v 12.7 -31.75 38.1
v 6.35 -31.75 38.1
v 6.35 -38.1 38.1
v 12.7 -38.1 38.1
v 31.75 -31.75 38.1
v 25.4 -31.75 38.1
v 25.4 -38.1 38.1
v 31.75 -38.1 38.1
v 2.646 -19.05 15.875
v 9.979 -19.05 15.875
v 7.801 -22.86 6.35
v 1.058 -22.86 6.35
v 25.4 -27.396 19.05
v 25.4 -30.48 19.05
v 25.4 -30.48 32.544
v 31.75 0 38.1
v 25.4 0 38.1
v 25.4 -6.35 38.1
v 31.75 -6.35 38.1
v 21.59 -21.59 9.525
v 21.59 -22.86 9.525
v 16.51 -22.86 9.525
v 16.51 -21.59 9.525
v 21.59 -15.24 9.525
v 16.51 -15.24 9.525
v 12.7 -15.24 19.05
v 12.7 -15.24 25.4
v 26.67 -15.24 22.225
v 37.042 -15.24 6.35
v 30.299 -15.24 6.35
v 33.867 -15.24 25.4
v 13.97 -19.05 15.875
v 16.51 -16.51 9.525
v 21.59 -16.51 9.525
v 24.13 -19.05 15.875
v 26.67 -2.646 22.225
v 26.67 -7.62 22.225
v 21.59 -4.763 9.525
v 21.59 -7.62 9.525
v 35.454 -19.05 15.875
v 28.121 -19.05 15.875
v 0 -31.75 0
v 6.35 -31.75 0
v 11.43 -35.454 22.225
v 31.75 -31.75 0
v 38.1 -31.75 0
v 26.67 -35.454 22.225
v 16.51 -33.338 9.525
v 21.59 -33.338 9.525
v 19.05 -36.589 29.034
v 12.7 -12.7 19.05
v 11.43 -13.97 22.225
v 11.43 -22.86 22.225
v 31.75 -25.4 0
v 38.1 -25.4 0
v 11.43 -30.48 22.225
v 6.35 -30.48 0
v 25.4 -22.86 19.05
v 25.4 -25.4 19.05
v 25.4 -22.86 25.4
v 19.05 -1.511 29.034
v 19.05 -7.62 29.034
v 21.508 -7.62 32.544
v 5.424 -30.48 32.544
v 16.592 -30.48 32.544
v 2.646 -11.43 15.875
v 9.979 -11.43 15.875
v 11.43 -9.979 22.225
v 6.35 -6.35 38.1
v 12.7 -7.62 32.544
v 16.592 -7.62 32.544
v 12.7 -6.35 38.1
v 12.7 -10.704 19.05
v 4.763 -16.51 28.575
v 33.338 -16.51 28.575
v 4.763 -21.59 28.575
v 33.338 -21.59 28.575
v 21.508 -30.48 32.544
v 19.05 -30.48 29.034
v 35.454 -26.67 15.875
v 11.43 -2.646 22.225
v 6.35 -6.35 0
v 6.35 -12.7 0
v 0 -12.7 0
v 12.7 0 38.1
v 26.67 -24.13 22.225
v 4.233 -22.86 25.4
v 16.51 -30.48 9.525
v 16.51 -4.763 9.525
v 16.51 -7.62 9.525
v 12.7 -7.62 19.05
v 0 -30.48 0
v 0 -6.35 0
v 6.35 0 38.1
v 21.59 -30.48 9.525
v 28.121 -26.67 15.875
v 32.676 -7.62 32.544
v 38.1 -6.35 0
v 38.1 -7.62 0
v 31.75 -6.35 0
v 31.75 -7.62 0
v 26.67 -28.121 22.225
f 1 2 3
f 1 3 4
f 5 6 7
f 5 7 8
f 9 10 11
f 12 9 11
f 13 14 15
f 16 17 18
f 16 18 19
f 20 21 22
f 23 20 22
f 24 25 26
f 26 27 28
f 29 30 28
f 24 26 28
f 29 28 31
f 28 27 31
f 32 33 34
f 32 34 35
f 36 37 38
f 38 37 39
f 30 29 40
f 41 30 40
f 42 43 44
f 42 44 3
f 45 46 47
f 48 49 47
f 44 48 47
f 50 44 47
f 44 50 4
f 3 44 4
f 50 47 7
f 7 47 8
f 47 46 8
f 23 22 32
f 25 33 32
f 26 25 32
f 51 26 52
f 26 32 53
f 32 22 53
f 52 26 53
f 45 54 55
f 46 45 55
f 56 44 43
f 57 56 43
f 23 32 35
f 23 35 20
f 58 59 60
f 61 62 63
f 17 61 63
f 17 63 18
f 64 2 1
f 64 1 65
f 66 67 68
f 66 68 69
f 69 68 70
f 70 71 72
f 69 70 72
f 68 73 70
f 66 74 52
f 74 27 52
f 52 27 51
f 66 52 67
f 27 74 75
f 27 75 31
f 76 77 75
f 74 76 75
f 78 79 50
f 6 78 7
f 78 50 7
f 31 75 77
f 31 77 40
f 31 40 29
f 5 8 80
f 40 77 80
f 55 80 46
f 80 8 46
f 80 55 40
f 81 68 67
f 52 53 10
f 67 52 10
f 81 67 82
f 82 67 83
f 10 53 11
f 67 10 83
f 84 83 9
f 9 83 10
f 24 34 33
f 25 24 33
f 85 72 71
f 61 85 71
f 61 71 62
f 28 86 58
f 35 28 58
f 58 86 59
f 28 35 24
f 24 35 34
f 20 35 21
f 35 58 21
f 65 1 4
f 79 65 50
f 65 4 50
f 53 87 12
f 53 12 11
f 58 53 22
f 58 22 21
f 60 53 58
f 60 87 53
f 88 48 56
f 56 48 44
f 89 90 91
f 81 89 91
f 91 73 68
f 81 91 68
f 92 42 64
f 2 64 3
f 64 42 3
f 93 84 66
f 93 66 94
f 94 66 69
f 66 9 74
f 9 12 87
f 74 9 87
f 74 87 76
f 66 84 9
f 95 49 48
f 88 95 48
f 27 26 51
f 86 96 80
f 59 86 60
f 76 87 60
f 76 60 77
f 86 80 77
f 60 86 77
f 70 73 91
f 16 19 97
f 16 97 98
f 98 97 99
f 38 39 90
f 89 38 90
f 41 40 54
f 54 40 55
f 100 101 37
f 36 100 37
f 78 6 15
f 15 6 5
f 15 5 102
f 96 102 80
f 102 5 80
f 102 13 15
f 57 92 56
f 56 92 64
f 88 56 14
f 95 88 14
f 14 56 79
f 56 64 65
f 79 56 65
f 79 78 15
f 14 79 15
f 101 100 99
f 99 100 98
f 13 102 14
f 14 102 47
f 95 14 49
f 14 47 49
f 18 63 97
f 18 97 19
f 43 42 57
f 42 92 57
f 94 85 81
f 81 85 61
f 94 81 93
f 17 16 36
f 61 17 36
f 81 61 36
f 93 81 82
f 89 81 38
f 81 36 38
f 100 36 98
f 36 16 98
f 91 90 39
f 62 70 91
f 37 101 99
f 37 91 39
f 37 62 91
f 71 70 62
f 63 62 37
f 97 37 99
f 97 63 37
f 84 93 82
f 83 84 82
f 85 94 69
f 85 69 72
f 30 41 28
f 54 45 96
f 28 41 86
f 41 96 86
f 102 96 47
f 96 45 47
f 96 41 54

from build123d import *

# Parameters (mm, degrees)
F0_W      = 38.1
F0_H      = 38.1
F1_DEPTH  = 38.1
F6_DEPTH  = 38.1
F8_DEPTH  = 38.1
F9_W      = 25.4
F9_H      = 7.62
F10_DEPTH = 38.1


with BuildPart() as f1:
    # F0 (on Front) → F1 (new body)
    with BuildSketch(Plane.XZ):
        with Locations((19.05, 19.05)):
            Rectangle(F0_W, F0_H)
    extrude(amount=F1_DEPTH)

    # F5 (on offset) → F6 (cut)
    with BuildSketch(Plane.YZ.offset(38.1)):
        Polygon((-11.43, 15.875), (-6.35, 38.1), (-31.75, 38.1), (-26.67, 15.875), (-21.59, 28.575), (-16.51, 28.575), align=None)
        Polygon((-25.4, 0), (-12.7, 0), (-19.05, 15.875), align=None)
        Polygon((-6.35, 0), (0, 0), (0, 38.1), align=None)
        Polygon((-31.75, 0), (-38.1, 38.1), (-38.1, 0), align=None)
    extrude(amount=-F6_DEPTH, mode=Mode.SUBTRACT)

    # F7 (on offset) → F8 (cut)
    with BuildSketch(Plane.XZ.offset(38.1)):
        Polygon((0, 38.1), (0, 0), (6.35, 38.1), align=None)
        Polygon((25.4, 38.1), (12.7, 38.1), (19.05, 29.0341), align=None)
        Polygon((31.75, 38.1), (38.1, 0), (38.1, 38.1), align=None)
        Polygon((11.43, 22.225), (6.35, 0), (31.75, 0), (26.67, 22.225), (21.59, 9.525), (16.51, 9.525), align=None)
    extrude(amount=-F8_DEPTH, mode=Mode.SUBTRACT)

    # F9 (on offset) → F10 (cut)
    with BuildSketch(Plane.XY.offset(38.1)):
        with Locations((25.4, -11.43)):
            Rectangle(F9_W, F9_H)
        with Locations((12.7, -26.67)):
            Rectangle(F9_W, F9_H)
    extrude(amount=-F10_DEPTH, mode=Mode.SUBTRACT)


solid = f1.part
